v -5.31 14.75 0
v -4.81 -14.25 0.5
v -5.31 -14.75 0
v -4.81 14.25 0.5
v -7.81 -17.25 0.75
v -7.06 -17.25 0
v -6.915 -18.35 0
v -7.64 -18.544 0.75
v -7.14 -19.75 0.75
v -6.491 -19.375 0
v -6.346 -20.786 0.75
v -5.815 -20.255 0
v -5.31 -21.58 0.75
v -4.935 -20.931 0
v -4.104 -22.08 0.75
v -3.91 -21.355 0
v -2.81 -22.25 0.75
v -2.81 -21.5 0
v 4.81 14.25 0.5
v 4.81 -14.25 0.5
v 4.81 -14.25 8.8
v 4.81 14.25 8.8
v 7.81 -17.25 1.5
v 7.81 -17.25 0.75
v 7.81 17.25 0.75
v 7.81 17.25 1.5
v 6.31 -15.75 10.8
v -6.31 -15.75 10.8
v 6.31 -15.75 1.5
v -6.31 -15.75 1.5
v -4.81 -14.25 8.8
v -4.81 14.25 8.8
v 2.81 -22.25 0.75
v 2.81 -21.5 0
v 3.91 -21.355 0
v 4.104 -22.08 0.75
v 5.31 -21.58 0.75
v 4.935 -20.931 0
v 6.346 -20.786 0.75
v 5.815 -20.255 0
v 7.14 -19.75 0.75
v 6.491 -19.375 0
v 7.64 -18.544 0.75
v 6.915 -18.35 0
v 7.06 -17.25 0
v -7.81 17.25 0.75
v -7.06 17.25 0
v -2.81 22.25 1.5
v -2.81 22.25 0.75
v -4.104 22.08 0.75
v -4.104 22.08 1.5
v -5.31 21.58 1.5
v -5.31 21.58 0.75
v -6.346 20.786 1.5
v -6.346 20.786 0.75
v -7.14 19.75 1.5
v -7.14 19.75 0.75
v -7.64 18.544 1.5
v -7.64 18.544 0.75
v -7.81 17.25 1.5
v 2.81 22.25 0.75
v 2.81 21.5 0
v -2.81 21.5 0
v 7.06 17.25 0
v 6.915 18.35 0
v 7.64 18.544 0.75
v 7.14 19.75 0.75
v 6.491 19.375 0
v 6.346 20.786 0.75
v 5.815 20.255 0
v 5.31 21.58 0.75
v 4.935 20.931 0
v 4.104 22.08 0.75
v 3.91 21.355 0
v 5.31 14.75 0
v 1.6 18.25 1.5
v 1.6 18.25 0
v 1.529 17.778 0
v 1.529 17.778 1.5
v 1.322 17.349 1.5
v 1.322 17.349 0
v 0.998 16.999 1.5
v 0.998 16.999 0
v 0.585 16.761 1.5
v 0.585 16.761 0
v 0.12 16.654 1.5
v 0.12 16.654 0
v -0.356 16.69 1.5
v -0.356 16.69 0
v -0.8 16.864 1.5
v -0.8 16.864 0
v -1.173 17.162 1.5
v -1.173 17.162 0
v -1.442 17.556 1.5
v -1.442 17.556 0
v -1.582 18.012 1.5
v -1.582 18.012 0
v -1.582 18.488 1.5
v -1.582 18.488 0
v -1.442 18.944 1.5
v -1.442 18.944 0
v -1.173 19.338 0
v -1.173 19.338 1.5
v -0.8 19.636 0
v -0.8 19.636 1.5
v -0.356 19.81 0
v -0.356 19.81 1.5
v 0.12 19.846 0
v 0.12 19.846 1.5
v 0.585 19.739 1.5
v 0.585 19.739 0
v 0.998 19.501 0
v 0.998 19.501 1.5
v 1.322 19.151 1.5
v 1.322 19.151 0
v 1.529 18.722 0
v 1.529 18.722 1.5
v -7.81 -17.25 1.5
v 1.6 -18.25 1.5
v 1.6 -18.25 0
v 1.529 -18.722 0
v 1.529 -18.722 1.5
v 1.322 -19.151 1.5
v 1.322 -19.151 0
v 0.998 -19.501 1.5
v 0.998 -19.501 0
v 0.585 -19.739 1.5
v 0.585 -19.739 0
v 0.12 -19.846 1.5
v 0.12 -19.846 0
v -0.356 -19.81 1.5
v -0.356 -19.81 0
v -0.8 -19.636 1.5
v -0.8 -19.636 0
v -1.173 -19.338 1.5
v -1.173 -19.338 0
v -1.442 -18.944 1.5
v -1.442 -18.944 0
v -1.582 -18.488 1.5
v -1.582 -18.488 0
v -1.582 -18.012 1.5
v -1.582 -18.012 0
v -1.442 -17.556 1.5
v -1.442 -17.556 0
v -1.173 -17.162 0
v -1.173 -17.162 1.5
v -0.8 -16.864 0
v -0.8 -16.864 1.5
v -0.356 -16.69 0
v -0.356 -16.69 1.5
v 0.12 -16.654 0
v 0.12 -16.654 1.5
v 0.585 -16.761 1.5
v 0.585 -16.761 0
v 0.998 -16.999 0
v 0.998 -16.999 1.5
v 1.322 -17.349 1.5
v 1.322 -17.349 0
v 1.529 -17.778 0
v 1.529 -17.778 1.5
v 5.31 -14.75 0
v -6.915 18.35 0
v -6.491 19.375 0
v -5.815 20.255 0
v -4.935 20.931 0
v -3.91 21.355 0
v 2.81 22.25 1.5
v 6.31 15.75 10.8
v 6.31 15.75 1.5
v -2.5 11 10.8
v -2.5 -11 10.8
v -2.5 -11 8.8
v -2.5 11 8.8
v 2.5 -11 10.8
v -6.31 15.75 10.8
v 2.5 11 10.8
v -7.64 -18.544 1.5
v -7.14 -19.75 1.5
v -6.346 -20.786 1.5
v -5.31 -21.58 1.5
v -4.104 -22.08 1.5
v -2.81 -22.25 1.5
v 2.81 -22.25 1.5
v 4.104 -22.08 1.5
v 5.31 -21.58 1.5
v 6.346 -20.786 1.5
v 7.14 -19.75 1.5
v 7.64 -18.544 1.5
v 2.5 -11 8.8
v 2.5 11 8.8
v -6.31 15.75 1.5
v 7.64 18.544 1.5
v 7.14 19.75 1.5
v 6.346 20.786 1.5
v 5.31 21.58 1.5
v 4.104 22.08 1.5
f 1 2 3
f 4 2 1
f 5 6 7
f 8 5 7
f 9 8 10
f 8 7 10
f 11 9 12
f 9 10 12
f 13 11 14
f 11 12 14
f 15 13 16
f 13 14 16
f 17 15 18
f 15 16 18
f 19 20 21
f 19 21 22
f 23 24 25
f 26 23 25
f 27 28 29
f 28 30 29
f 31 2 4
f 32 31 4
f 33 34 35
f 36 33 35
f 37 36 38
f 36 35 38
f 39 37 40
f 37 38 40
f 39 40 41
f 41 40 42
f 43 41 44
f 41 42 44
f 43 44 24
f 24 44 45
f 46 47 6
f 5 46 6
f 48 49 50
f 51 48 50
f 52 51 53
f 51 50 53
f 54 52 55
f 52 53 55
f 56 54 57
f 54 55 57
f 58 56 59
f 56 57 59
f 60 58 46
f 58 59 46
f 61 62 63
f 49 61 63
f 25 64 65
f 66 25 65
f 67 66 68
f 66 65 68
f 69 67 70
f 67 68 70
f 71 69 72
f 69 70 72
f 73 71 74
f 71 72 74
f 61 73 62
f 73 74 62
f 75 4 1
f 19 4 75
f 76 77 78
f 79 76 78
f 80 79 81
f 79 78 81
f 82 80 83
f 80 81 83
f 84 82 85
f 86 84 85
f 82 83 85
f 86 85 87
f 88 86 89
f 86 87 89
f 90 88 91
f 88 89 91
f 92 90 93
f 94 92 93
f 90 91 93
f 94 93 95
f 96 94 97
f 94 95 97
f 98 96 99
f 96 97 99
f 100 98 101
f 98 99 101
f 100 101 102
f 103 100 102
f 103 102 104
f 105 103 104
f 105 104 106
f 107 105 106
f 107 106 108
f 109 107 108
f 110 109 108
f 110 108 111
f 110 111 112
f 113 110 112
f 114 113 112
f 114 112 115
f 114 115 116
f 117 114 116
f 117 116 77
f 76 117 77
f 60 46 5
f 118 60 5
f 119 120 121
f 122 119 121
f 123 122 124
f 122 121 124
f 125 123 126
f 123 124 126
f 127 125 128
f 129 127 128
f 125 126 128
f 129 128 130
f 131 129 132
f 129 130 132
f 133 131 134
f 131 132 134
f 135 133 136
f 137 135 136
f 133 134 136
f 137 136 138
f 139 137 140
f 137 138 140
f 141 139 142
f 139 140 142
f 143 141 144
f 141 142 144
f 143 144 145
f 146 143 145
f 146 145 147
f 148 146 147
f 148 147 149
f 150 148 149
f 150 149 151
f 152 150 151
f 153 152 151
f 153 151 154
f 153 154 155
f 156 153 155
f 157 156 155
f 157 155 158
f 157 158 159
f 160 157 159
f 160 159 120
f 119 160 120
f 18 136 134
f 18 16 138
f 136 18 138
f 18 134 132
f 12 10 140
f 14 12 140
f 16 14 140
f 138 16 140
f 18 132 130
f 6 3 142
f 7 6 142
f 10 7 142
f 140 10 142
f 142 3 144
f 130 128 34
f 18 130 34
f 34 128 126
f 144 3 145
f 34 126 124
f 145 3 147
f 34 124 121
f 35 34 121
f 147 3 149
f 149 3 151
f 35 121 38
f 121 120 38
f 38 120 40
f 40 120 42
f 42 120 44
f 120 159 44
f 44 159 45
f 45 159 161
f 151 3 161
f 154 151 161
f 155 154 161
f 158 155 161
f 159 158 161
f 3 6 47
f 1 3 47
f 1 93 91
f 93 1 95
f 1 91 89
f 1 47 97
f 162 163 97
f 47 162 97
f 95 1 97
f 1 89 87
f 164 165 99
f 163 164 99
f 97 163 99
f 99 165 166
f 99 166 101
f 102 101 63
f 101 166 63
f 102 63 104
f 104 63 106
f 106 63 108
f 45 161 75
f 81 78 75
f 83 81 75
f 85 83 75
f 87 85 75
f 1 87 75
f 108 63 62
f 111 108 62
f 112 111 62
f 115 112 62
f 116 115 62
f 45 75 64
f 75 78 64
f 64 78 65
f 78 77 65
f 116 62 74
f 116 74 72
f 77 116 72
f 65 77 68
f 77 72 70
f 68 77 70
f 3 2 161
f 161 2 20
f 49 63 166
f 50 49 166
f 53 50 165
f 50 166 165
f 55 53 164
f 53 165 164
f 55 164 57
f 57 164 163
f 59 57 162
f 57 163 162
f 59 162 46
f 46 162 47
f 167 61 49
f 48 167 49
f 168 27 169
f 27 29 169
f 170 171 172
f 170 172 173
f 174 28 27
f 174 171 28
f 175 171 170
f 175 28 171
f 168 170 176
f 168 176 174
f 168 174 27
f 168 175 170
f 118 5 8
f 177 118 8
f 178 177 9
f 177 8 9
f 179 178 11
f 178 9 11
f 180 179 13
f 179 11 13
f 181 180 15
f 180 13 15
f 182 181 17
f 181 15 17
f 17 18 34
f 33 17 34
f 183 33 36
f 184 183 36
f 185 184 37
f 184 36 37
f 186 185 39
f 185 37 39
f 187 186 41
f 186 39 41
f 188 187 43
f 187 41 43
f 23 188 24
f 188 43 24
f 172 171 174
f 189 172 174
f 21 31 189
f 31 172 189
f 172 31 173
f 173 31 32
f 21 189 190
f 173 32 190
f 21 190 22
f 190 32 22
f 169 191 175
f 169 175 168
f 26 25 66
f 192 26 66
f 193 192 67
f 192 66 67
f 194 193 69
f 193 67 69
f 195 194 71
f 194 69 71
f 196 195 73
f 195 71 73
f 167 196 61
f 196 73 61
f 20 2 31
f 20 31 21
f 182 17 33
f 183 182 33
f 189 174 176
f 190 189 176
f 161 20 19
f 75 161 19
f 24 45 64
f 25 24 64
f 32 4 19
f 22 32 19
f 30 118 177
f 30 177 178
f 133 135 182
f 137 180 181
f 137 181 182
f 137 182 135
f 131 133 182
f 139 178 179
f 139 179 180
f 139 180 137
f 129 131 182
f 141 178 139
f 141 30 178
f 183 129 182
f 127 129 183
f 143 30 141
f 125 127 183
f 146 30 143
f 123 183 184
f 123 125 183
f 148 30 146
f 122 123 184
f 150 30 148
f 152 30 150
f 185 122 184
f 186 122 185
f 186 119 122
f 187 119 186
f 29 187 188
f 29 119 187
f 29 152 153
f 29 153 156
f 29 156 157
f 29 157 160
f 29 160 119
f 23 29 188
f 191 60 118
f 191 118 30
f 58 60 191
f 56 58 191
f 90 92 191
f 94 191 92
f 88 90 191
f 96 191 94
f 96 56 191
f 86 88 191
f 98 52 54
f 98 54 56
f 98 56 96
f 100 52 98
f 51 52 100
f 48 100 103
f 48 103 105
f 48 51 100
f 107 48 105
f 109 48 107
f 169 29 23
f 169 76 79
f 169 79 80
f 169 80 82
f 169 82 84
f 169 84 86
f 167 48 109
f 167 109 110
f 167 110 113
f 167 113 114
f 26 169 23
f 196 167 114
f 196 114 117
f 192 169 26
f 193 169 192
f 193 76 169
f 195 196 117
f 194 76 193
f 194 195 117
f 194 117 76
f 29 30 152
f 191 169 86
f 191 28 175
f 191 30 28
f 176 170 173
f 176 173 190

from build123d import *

# Parameters (mm, degrees)
F0_W     = 9.62
F0_H     = 28.5
F1_DEPTH = 1.5
F2_W     = 12.62
F2_H     = 31.5
F2_W_2   = 9.62
F2_H_2   = 28.5
F3_DEPTH = 7.3
F4_W     = 12.62
F4_H     = 31.5
F5_DEPTH = 2
F6_W     = 5
F6_H     = 22
F7_DEPTH = 25
F8_R     = 1.6
F9_DEPTH = 25
F10_SIZE = 0.75
F11_SIZE = 0.5


with BuildPart() as f1:
    # F0 (on Top) → F1 (new body)
    with BuildSketch(Plane.XY):
        with BuildLine():
            Line((2.81, 22.25), (-2.81, 22.25))
            ThreePointArc((-2.81, 22.25), (-6.345534, 20.785534), (-7.81, 17.25))
            Line((-7.81, 17.25), (-7.81, -17.25))
            ThreePointArc((-7.81, -17.25), (-6.345534, -20.785534), (-2.81, -22.25))
            Line((-2.81, -22.25), (2.81, -22.25))
            ThreePointArc((2.81, -22.25), (6.345534, -20.785534), (7.81, -17.25))
            Line((7.81, -17.25), (7.81, 17.25))
            ThreePointArc((7.81, 17.25), (6.345534, 20.785534), (2.81, 22.25))
        make_face()
        Rectangle(F0_W, F0_H, mode=Mode.SUBTRACT)
    extrude(amount=F1_DEPTH)

    # F2 (on face) → F3 (join)
    with BuildSketch(Plane.XY.offset(1.5)):
        Rectangle(F2_W, F2_H)
        Rectangle(F2_W_2, F2_H_2, mode=Mode.SUBTRACT)
    extrude(amount=F3_DEPTH)

    # F4 (on face) → F5 (join)
    with BuildSketch(Plane.XY.offset(8.8)):
        Rectangle(F4_W, F4_H)
    extrude(amount=F5_DEPTH)

    # F6 (on face) → F7 (cut)
    with BuildSketch(Plane.XY.offset(10.8)):
        Rectangle(F6_W, F6_H)
    extrude(amount=-F7_DEPTH, mode=Mode.SUBTRACT)

    # F8 (on face) → F9 (cut)
    with BuildSketch(Plane(origin=(0, 0, 0), x_dir=(1, 0, 0), z_dir=(0, 0, -1))):
        with Locations((0, 18.25)):
            Circle(F8_R)
        with Locations((0, -18.25)):
            Circle(F8_R)
    extrude(amount=-F9_DEPTH, mode=Mode.SUBTRACT)

    # F10
    f10_edges = [f1.edges().sort_by_distance(p)[0] for p in [
        (7.81, 0, 0),
    ]]
    chamfer(f10_edges, length=F10_SIZE)

    # F11
    f11_edges = [f1.edges().sort_by_distance(p)[0] for p in [
        (0, -14.25, 0),
        (4.81, 0, 0),
        (-4.81, 0, 0),
        (0, 14.25, 0),
    ]]
    chamfer(f11_edges, length=F11_SIZE)


solid = f1.part
